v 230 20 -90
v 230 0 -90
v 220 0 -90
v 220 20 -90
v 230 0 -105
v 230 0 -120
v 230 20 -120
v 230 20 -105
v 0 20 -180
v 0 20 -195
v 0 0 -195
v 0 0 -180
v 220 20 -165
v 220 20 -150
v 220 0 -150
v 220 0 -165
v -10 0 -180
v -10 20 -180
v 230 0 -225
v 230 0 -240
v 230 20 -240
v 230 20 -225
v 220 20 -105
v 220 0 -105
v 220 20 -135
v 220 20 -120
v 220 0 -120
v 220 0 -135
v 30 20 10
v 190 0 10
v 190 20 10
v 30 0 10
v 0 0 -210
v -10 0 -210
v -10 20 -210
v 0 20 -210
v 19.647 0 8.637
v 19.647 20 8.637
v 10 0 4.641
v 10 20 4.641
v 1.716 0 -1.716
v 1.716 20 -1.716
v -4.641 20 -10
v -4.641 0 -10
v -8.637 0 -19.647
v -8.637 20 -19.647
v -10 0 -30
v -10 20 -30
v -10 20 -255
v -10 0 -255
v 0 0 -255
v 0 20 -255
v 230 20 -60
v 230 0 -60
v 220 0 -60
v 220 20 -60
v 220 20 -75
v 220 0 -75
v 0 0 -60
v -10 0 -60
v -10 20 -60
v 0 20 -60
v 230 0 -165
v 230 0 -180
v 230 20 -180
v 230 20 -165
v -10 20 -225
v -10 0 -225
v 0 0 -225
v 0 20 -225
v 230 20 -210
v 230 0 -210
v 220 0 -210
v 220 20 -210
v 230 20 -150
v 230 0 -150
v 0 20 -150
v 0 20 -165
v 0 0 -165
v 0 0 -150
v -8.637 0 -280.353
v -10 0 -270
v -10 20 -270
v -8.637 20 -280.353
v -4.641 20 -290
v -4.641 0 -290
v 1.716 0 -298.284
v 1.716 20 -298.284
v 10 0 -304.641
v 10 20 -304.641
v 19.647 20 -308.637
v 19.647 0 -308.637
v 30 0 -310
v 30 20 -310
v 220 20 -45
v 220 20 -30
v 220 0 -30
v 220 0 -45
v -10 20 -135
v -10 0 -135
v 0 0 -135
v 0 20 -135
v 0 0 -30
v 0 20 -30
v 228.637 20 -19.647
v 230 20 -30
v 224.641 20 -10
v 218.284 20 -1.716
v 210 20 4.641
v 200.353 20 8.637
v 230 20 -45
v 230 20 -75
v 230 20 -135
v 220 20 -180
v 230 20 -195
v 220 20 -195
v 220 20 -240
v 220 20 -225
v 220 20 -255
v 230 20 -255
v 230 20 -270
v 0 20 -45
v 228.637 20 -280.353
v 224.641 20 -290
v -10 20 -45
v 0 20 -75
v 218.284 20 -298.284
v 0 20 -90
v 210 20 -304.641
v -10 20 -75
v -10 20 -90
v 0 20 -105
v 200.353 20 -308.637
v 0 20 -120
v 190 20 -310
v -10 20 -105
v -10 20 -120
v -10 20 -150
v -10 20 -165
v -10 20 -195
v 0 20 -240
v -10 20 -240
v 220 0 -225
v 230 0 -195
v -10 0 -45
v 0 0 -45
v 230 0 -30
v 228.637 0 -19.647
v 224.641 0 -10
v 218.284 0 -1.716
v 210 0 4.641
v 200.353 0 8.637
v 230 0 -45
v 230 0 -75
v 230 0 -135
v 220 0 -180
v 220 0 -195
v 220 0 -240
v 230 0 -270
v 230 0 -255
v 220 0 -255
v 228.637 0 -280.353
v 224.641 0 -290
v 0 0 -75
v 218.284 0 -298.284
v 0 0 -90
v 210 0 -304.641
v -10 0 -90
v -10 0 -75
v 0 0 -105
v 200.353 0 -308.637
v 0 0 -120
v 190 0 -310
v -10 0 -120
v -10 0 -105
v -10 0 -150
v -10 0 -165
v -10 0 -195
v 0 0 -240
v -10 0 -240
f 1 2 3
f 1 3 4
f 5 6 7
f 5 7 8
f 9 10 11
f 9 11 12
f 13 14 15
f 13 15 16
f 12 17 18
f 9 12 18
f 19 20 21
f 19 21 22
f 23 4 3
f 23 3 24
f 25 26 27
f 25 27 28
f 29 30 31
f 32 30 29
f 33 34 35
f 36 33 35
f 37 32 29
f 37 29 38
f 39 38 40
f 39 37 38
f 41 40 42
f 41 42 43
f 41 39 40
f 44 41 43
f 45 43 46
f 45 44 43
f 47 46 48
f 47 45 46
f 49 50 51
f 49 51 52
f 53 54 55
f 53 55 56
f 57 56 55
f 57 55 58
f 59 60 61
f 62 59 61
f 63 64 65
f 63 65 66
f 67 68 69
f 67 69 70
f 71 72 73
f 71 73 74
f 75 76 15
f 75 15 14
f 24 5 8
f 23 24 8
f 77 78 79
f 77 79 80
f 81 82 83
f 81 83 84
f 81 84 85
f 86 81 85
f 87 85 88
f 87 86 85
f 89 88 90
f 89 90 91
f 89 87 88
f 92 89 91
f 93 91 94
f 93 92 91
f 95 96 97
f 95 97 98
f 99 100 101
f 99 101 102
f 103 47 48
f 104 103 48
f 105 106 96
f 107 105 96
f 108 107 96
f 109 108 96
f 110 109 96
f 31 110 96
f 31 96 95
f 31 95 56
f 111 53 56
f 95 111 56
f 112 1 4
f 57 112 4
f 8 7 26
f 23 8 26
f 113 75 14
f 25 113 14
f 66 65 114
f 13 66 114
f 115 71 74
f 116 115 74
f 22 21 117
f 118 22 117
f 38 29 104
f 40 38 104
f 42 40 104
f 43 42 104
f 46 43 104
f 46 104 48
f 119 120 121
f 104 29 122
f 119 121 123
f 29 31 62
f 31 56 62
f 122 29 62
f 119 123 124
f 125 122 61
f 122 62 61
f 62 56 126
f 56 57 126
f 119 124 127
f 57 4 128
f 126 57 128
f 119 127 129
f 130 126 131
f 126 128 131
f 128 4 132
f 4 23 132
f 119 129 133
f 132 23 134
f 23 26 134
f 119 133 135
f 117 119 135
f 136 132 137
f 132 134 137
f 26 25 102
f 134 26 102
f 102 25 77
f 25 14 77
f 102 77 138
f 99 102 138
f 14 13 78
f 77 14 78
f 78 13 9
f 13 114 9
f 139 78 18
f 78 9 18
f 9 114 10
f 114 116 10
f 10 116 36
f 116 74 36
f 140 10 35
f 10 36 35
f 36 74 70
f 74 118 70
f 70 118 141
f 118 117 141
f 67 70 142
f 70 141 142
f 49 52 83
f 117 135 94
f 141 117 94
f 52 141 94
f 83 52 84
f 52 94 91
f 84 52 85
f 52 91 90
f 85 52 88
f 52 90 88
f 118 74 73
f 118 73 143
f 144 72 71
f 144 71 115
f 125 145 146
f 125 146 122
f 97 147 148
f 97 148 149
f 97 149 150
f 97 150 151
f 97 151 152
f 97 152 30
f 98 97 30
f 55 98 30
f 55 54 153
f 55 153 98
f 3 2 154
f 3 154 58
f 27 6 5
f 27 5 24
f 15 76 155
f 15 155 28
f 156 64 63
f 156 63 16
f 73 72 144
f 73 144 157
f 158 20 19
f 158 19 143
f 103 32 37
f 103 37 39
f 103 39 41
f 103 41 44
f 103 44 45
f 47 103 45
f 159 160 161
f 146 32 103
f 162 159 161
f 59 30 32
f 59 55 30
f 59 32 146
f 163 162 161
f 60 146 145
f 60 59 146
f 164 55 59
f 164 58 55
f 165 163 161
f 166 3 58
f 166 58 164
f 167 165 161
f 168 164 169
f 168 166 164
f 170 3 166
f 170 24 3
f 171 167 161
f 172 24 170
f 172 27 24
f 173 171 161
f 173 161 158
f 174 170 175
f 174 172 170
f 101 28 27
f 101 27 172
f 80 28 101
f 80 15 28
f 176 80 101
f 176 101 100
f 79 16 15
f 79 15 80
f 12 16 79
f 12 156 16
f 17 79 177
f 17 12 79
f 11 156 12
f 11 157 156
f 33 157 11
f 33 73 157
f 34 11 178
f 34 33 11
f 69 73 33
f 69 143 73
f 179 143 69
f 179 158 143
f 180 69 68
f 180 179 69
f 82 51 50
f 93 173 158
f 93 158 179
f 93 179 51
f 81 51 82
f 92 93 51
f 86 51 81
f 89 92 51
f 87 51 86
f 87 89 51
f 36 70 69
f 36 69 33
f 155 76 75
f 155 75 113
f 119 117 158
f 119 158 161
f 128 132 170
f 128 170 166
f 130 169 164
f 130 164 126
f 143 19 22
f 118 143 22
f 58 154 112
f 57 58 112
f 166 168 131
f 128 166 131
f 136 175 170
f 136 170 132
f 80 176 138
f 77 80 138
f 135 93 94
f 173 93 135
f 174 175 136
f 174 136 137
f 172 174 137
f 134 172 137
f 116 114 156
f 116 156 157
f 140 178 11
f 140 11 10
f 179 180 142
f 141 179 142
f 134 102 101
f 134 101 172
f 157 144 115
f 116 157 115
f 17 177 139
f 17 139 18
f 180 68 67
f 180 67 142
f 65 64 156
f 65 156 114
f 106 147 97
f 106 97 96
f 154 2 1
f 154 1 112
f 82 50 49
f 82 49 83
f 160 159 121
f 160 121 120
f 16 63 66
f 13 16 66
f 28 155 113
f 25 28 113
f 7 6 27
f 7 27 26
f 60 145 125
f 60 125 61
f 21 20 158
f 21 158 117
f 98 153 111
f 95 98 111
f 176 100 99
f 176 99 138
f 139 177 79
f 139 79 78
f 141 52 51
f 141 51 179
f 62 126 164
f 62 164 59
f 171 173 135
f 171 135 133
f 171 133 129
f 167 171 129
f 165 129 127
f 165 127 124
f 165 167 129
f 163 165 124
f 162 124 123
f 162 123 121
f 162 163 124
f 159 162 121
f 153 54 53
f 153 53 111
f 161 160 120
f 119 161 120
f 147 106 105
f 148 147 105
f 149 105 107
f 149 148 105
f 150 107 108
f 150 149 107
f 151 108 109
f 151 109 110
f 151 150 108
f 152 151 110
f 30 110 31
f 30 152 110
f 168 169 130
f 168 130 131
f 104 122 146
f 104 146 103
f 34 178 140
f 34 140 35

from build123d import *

# Parameters (mm, degrees)
BOSS_EXTRUDE1_DEPTH = 20
SKETCH3_W           = 15
SKETCH3_H           = 20
CUT_EXTRUDE1_DEPTH  = 10
SKETCH4_W           = 15
SKETCH4_H           = 20
CUT_EXTRUDE2_DEPTH  = 10


with BuildPart() as part:
    # Sketch1 → Boss-Extrude1 (new body)
    with BuildSketch(Plane(origin=(0, 0, 0), x_dir=(1, 0, 0), z_dir=(0, 1, 0))):
        with BuildLine():
            Line((-10, 30), (-10, 270))
            ThreePointArc((-10, 270), (1.715728753, 298.284271247), (30, 310))
            Line((30, 310), (190, 310))
            ThreePointArc((190, 310), (218.284271247, 298.284271247), (230, 270))
            Line((230, 270), (230, 30))
            ThreePointArc((230, 30), (218.284271247, 1.715728753), (190, -10))
            Line((190, -10), (30, -10))
            ThreePointArc((30, -10), (1.715728753, 1.715728753), (-10, 30))
        make_face()
    extrude(amount=BOSS_EXTRUDE1_DEPTH)

    # Sketch3 → Cut-Extrude1 (cut)
    with BuildSketch(Plane.ZY.offset(10)):
        with Locations((-247.5, 10)):
            Rectangle(SKETCH3_W, SKETCH3_H)
        with Locations((-217.5, 10)):
            Rectangle(SKETCH3_W, SKETCH3_H)
        with Locations((-187.5, 10)):
            Rectangle(SKETCH3_W, SKETCH3_H)
        with Locations((-157.5, 10)):
            Rectangle(SKETCH3_W, SKETCH3_H)
        with Locations((-127.5, 10)):
            Rectangle(SKETCH3_W, SKETCH3_H)
        with Locations((-97.5, 10)):
            Rectangle(SKETCH3_W, SKETCH3_H)
        with Locations((-67.5, 10)):
            Rectangle(SKETCH3_W, SKETCH3_H)
        with Locations((-37.5, 10)):
            Rectangle(SKETCH3_W, SKETCH3_H)
    extrude(amount=-CUT_EXTRUDE1_DEPTH, mode=Mode.SUBTRACT)

    # Sketch4 → Cut-Extrude2 (cut)
    with BuildSketch(Plane(origin=(230, 0, 0), x_dir=(0, 0, -1), z_dir=(1, 0, 0))):
        with Locations((247.5, 10)):
            Rectangle(SKETCH4_W, SKETCH4_H)
        with Locations((217.5, 10)):
            Rectangle(SKETCH4_W, SKETCH4_H)
        with Locations((157.5, 10)):
            Rectangle(SKETCH4_W, SKETCH4_H)
        with Locations((127.5, 10)):
            Rectangle(SKETCH4_W, SKETCH4_H)
        with Locations((97.5, 10)):
            Rectangle(SKETCH4_W, SKETCH4_H)
        with Locations((67.5, 10)):
            Rectangle(SKETCH4_W, SKETCH4_H)
        with Locations((37.5, 10)):
            Rectangle(SKETCH4_W, SKETCH4_H)
        with Locations((187.5, 10)):
            Rectangle(SKETCH4_W, SKETCH4_H)
    extrude(amount=-CUT_EXTRUDE2_DEPTH, mode=Mode.SUBTRACT)


solid = part.part
